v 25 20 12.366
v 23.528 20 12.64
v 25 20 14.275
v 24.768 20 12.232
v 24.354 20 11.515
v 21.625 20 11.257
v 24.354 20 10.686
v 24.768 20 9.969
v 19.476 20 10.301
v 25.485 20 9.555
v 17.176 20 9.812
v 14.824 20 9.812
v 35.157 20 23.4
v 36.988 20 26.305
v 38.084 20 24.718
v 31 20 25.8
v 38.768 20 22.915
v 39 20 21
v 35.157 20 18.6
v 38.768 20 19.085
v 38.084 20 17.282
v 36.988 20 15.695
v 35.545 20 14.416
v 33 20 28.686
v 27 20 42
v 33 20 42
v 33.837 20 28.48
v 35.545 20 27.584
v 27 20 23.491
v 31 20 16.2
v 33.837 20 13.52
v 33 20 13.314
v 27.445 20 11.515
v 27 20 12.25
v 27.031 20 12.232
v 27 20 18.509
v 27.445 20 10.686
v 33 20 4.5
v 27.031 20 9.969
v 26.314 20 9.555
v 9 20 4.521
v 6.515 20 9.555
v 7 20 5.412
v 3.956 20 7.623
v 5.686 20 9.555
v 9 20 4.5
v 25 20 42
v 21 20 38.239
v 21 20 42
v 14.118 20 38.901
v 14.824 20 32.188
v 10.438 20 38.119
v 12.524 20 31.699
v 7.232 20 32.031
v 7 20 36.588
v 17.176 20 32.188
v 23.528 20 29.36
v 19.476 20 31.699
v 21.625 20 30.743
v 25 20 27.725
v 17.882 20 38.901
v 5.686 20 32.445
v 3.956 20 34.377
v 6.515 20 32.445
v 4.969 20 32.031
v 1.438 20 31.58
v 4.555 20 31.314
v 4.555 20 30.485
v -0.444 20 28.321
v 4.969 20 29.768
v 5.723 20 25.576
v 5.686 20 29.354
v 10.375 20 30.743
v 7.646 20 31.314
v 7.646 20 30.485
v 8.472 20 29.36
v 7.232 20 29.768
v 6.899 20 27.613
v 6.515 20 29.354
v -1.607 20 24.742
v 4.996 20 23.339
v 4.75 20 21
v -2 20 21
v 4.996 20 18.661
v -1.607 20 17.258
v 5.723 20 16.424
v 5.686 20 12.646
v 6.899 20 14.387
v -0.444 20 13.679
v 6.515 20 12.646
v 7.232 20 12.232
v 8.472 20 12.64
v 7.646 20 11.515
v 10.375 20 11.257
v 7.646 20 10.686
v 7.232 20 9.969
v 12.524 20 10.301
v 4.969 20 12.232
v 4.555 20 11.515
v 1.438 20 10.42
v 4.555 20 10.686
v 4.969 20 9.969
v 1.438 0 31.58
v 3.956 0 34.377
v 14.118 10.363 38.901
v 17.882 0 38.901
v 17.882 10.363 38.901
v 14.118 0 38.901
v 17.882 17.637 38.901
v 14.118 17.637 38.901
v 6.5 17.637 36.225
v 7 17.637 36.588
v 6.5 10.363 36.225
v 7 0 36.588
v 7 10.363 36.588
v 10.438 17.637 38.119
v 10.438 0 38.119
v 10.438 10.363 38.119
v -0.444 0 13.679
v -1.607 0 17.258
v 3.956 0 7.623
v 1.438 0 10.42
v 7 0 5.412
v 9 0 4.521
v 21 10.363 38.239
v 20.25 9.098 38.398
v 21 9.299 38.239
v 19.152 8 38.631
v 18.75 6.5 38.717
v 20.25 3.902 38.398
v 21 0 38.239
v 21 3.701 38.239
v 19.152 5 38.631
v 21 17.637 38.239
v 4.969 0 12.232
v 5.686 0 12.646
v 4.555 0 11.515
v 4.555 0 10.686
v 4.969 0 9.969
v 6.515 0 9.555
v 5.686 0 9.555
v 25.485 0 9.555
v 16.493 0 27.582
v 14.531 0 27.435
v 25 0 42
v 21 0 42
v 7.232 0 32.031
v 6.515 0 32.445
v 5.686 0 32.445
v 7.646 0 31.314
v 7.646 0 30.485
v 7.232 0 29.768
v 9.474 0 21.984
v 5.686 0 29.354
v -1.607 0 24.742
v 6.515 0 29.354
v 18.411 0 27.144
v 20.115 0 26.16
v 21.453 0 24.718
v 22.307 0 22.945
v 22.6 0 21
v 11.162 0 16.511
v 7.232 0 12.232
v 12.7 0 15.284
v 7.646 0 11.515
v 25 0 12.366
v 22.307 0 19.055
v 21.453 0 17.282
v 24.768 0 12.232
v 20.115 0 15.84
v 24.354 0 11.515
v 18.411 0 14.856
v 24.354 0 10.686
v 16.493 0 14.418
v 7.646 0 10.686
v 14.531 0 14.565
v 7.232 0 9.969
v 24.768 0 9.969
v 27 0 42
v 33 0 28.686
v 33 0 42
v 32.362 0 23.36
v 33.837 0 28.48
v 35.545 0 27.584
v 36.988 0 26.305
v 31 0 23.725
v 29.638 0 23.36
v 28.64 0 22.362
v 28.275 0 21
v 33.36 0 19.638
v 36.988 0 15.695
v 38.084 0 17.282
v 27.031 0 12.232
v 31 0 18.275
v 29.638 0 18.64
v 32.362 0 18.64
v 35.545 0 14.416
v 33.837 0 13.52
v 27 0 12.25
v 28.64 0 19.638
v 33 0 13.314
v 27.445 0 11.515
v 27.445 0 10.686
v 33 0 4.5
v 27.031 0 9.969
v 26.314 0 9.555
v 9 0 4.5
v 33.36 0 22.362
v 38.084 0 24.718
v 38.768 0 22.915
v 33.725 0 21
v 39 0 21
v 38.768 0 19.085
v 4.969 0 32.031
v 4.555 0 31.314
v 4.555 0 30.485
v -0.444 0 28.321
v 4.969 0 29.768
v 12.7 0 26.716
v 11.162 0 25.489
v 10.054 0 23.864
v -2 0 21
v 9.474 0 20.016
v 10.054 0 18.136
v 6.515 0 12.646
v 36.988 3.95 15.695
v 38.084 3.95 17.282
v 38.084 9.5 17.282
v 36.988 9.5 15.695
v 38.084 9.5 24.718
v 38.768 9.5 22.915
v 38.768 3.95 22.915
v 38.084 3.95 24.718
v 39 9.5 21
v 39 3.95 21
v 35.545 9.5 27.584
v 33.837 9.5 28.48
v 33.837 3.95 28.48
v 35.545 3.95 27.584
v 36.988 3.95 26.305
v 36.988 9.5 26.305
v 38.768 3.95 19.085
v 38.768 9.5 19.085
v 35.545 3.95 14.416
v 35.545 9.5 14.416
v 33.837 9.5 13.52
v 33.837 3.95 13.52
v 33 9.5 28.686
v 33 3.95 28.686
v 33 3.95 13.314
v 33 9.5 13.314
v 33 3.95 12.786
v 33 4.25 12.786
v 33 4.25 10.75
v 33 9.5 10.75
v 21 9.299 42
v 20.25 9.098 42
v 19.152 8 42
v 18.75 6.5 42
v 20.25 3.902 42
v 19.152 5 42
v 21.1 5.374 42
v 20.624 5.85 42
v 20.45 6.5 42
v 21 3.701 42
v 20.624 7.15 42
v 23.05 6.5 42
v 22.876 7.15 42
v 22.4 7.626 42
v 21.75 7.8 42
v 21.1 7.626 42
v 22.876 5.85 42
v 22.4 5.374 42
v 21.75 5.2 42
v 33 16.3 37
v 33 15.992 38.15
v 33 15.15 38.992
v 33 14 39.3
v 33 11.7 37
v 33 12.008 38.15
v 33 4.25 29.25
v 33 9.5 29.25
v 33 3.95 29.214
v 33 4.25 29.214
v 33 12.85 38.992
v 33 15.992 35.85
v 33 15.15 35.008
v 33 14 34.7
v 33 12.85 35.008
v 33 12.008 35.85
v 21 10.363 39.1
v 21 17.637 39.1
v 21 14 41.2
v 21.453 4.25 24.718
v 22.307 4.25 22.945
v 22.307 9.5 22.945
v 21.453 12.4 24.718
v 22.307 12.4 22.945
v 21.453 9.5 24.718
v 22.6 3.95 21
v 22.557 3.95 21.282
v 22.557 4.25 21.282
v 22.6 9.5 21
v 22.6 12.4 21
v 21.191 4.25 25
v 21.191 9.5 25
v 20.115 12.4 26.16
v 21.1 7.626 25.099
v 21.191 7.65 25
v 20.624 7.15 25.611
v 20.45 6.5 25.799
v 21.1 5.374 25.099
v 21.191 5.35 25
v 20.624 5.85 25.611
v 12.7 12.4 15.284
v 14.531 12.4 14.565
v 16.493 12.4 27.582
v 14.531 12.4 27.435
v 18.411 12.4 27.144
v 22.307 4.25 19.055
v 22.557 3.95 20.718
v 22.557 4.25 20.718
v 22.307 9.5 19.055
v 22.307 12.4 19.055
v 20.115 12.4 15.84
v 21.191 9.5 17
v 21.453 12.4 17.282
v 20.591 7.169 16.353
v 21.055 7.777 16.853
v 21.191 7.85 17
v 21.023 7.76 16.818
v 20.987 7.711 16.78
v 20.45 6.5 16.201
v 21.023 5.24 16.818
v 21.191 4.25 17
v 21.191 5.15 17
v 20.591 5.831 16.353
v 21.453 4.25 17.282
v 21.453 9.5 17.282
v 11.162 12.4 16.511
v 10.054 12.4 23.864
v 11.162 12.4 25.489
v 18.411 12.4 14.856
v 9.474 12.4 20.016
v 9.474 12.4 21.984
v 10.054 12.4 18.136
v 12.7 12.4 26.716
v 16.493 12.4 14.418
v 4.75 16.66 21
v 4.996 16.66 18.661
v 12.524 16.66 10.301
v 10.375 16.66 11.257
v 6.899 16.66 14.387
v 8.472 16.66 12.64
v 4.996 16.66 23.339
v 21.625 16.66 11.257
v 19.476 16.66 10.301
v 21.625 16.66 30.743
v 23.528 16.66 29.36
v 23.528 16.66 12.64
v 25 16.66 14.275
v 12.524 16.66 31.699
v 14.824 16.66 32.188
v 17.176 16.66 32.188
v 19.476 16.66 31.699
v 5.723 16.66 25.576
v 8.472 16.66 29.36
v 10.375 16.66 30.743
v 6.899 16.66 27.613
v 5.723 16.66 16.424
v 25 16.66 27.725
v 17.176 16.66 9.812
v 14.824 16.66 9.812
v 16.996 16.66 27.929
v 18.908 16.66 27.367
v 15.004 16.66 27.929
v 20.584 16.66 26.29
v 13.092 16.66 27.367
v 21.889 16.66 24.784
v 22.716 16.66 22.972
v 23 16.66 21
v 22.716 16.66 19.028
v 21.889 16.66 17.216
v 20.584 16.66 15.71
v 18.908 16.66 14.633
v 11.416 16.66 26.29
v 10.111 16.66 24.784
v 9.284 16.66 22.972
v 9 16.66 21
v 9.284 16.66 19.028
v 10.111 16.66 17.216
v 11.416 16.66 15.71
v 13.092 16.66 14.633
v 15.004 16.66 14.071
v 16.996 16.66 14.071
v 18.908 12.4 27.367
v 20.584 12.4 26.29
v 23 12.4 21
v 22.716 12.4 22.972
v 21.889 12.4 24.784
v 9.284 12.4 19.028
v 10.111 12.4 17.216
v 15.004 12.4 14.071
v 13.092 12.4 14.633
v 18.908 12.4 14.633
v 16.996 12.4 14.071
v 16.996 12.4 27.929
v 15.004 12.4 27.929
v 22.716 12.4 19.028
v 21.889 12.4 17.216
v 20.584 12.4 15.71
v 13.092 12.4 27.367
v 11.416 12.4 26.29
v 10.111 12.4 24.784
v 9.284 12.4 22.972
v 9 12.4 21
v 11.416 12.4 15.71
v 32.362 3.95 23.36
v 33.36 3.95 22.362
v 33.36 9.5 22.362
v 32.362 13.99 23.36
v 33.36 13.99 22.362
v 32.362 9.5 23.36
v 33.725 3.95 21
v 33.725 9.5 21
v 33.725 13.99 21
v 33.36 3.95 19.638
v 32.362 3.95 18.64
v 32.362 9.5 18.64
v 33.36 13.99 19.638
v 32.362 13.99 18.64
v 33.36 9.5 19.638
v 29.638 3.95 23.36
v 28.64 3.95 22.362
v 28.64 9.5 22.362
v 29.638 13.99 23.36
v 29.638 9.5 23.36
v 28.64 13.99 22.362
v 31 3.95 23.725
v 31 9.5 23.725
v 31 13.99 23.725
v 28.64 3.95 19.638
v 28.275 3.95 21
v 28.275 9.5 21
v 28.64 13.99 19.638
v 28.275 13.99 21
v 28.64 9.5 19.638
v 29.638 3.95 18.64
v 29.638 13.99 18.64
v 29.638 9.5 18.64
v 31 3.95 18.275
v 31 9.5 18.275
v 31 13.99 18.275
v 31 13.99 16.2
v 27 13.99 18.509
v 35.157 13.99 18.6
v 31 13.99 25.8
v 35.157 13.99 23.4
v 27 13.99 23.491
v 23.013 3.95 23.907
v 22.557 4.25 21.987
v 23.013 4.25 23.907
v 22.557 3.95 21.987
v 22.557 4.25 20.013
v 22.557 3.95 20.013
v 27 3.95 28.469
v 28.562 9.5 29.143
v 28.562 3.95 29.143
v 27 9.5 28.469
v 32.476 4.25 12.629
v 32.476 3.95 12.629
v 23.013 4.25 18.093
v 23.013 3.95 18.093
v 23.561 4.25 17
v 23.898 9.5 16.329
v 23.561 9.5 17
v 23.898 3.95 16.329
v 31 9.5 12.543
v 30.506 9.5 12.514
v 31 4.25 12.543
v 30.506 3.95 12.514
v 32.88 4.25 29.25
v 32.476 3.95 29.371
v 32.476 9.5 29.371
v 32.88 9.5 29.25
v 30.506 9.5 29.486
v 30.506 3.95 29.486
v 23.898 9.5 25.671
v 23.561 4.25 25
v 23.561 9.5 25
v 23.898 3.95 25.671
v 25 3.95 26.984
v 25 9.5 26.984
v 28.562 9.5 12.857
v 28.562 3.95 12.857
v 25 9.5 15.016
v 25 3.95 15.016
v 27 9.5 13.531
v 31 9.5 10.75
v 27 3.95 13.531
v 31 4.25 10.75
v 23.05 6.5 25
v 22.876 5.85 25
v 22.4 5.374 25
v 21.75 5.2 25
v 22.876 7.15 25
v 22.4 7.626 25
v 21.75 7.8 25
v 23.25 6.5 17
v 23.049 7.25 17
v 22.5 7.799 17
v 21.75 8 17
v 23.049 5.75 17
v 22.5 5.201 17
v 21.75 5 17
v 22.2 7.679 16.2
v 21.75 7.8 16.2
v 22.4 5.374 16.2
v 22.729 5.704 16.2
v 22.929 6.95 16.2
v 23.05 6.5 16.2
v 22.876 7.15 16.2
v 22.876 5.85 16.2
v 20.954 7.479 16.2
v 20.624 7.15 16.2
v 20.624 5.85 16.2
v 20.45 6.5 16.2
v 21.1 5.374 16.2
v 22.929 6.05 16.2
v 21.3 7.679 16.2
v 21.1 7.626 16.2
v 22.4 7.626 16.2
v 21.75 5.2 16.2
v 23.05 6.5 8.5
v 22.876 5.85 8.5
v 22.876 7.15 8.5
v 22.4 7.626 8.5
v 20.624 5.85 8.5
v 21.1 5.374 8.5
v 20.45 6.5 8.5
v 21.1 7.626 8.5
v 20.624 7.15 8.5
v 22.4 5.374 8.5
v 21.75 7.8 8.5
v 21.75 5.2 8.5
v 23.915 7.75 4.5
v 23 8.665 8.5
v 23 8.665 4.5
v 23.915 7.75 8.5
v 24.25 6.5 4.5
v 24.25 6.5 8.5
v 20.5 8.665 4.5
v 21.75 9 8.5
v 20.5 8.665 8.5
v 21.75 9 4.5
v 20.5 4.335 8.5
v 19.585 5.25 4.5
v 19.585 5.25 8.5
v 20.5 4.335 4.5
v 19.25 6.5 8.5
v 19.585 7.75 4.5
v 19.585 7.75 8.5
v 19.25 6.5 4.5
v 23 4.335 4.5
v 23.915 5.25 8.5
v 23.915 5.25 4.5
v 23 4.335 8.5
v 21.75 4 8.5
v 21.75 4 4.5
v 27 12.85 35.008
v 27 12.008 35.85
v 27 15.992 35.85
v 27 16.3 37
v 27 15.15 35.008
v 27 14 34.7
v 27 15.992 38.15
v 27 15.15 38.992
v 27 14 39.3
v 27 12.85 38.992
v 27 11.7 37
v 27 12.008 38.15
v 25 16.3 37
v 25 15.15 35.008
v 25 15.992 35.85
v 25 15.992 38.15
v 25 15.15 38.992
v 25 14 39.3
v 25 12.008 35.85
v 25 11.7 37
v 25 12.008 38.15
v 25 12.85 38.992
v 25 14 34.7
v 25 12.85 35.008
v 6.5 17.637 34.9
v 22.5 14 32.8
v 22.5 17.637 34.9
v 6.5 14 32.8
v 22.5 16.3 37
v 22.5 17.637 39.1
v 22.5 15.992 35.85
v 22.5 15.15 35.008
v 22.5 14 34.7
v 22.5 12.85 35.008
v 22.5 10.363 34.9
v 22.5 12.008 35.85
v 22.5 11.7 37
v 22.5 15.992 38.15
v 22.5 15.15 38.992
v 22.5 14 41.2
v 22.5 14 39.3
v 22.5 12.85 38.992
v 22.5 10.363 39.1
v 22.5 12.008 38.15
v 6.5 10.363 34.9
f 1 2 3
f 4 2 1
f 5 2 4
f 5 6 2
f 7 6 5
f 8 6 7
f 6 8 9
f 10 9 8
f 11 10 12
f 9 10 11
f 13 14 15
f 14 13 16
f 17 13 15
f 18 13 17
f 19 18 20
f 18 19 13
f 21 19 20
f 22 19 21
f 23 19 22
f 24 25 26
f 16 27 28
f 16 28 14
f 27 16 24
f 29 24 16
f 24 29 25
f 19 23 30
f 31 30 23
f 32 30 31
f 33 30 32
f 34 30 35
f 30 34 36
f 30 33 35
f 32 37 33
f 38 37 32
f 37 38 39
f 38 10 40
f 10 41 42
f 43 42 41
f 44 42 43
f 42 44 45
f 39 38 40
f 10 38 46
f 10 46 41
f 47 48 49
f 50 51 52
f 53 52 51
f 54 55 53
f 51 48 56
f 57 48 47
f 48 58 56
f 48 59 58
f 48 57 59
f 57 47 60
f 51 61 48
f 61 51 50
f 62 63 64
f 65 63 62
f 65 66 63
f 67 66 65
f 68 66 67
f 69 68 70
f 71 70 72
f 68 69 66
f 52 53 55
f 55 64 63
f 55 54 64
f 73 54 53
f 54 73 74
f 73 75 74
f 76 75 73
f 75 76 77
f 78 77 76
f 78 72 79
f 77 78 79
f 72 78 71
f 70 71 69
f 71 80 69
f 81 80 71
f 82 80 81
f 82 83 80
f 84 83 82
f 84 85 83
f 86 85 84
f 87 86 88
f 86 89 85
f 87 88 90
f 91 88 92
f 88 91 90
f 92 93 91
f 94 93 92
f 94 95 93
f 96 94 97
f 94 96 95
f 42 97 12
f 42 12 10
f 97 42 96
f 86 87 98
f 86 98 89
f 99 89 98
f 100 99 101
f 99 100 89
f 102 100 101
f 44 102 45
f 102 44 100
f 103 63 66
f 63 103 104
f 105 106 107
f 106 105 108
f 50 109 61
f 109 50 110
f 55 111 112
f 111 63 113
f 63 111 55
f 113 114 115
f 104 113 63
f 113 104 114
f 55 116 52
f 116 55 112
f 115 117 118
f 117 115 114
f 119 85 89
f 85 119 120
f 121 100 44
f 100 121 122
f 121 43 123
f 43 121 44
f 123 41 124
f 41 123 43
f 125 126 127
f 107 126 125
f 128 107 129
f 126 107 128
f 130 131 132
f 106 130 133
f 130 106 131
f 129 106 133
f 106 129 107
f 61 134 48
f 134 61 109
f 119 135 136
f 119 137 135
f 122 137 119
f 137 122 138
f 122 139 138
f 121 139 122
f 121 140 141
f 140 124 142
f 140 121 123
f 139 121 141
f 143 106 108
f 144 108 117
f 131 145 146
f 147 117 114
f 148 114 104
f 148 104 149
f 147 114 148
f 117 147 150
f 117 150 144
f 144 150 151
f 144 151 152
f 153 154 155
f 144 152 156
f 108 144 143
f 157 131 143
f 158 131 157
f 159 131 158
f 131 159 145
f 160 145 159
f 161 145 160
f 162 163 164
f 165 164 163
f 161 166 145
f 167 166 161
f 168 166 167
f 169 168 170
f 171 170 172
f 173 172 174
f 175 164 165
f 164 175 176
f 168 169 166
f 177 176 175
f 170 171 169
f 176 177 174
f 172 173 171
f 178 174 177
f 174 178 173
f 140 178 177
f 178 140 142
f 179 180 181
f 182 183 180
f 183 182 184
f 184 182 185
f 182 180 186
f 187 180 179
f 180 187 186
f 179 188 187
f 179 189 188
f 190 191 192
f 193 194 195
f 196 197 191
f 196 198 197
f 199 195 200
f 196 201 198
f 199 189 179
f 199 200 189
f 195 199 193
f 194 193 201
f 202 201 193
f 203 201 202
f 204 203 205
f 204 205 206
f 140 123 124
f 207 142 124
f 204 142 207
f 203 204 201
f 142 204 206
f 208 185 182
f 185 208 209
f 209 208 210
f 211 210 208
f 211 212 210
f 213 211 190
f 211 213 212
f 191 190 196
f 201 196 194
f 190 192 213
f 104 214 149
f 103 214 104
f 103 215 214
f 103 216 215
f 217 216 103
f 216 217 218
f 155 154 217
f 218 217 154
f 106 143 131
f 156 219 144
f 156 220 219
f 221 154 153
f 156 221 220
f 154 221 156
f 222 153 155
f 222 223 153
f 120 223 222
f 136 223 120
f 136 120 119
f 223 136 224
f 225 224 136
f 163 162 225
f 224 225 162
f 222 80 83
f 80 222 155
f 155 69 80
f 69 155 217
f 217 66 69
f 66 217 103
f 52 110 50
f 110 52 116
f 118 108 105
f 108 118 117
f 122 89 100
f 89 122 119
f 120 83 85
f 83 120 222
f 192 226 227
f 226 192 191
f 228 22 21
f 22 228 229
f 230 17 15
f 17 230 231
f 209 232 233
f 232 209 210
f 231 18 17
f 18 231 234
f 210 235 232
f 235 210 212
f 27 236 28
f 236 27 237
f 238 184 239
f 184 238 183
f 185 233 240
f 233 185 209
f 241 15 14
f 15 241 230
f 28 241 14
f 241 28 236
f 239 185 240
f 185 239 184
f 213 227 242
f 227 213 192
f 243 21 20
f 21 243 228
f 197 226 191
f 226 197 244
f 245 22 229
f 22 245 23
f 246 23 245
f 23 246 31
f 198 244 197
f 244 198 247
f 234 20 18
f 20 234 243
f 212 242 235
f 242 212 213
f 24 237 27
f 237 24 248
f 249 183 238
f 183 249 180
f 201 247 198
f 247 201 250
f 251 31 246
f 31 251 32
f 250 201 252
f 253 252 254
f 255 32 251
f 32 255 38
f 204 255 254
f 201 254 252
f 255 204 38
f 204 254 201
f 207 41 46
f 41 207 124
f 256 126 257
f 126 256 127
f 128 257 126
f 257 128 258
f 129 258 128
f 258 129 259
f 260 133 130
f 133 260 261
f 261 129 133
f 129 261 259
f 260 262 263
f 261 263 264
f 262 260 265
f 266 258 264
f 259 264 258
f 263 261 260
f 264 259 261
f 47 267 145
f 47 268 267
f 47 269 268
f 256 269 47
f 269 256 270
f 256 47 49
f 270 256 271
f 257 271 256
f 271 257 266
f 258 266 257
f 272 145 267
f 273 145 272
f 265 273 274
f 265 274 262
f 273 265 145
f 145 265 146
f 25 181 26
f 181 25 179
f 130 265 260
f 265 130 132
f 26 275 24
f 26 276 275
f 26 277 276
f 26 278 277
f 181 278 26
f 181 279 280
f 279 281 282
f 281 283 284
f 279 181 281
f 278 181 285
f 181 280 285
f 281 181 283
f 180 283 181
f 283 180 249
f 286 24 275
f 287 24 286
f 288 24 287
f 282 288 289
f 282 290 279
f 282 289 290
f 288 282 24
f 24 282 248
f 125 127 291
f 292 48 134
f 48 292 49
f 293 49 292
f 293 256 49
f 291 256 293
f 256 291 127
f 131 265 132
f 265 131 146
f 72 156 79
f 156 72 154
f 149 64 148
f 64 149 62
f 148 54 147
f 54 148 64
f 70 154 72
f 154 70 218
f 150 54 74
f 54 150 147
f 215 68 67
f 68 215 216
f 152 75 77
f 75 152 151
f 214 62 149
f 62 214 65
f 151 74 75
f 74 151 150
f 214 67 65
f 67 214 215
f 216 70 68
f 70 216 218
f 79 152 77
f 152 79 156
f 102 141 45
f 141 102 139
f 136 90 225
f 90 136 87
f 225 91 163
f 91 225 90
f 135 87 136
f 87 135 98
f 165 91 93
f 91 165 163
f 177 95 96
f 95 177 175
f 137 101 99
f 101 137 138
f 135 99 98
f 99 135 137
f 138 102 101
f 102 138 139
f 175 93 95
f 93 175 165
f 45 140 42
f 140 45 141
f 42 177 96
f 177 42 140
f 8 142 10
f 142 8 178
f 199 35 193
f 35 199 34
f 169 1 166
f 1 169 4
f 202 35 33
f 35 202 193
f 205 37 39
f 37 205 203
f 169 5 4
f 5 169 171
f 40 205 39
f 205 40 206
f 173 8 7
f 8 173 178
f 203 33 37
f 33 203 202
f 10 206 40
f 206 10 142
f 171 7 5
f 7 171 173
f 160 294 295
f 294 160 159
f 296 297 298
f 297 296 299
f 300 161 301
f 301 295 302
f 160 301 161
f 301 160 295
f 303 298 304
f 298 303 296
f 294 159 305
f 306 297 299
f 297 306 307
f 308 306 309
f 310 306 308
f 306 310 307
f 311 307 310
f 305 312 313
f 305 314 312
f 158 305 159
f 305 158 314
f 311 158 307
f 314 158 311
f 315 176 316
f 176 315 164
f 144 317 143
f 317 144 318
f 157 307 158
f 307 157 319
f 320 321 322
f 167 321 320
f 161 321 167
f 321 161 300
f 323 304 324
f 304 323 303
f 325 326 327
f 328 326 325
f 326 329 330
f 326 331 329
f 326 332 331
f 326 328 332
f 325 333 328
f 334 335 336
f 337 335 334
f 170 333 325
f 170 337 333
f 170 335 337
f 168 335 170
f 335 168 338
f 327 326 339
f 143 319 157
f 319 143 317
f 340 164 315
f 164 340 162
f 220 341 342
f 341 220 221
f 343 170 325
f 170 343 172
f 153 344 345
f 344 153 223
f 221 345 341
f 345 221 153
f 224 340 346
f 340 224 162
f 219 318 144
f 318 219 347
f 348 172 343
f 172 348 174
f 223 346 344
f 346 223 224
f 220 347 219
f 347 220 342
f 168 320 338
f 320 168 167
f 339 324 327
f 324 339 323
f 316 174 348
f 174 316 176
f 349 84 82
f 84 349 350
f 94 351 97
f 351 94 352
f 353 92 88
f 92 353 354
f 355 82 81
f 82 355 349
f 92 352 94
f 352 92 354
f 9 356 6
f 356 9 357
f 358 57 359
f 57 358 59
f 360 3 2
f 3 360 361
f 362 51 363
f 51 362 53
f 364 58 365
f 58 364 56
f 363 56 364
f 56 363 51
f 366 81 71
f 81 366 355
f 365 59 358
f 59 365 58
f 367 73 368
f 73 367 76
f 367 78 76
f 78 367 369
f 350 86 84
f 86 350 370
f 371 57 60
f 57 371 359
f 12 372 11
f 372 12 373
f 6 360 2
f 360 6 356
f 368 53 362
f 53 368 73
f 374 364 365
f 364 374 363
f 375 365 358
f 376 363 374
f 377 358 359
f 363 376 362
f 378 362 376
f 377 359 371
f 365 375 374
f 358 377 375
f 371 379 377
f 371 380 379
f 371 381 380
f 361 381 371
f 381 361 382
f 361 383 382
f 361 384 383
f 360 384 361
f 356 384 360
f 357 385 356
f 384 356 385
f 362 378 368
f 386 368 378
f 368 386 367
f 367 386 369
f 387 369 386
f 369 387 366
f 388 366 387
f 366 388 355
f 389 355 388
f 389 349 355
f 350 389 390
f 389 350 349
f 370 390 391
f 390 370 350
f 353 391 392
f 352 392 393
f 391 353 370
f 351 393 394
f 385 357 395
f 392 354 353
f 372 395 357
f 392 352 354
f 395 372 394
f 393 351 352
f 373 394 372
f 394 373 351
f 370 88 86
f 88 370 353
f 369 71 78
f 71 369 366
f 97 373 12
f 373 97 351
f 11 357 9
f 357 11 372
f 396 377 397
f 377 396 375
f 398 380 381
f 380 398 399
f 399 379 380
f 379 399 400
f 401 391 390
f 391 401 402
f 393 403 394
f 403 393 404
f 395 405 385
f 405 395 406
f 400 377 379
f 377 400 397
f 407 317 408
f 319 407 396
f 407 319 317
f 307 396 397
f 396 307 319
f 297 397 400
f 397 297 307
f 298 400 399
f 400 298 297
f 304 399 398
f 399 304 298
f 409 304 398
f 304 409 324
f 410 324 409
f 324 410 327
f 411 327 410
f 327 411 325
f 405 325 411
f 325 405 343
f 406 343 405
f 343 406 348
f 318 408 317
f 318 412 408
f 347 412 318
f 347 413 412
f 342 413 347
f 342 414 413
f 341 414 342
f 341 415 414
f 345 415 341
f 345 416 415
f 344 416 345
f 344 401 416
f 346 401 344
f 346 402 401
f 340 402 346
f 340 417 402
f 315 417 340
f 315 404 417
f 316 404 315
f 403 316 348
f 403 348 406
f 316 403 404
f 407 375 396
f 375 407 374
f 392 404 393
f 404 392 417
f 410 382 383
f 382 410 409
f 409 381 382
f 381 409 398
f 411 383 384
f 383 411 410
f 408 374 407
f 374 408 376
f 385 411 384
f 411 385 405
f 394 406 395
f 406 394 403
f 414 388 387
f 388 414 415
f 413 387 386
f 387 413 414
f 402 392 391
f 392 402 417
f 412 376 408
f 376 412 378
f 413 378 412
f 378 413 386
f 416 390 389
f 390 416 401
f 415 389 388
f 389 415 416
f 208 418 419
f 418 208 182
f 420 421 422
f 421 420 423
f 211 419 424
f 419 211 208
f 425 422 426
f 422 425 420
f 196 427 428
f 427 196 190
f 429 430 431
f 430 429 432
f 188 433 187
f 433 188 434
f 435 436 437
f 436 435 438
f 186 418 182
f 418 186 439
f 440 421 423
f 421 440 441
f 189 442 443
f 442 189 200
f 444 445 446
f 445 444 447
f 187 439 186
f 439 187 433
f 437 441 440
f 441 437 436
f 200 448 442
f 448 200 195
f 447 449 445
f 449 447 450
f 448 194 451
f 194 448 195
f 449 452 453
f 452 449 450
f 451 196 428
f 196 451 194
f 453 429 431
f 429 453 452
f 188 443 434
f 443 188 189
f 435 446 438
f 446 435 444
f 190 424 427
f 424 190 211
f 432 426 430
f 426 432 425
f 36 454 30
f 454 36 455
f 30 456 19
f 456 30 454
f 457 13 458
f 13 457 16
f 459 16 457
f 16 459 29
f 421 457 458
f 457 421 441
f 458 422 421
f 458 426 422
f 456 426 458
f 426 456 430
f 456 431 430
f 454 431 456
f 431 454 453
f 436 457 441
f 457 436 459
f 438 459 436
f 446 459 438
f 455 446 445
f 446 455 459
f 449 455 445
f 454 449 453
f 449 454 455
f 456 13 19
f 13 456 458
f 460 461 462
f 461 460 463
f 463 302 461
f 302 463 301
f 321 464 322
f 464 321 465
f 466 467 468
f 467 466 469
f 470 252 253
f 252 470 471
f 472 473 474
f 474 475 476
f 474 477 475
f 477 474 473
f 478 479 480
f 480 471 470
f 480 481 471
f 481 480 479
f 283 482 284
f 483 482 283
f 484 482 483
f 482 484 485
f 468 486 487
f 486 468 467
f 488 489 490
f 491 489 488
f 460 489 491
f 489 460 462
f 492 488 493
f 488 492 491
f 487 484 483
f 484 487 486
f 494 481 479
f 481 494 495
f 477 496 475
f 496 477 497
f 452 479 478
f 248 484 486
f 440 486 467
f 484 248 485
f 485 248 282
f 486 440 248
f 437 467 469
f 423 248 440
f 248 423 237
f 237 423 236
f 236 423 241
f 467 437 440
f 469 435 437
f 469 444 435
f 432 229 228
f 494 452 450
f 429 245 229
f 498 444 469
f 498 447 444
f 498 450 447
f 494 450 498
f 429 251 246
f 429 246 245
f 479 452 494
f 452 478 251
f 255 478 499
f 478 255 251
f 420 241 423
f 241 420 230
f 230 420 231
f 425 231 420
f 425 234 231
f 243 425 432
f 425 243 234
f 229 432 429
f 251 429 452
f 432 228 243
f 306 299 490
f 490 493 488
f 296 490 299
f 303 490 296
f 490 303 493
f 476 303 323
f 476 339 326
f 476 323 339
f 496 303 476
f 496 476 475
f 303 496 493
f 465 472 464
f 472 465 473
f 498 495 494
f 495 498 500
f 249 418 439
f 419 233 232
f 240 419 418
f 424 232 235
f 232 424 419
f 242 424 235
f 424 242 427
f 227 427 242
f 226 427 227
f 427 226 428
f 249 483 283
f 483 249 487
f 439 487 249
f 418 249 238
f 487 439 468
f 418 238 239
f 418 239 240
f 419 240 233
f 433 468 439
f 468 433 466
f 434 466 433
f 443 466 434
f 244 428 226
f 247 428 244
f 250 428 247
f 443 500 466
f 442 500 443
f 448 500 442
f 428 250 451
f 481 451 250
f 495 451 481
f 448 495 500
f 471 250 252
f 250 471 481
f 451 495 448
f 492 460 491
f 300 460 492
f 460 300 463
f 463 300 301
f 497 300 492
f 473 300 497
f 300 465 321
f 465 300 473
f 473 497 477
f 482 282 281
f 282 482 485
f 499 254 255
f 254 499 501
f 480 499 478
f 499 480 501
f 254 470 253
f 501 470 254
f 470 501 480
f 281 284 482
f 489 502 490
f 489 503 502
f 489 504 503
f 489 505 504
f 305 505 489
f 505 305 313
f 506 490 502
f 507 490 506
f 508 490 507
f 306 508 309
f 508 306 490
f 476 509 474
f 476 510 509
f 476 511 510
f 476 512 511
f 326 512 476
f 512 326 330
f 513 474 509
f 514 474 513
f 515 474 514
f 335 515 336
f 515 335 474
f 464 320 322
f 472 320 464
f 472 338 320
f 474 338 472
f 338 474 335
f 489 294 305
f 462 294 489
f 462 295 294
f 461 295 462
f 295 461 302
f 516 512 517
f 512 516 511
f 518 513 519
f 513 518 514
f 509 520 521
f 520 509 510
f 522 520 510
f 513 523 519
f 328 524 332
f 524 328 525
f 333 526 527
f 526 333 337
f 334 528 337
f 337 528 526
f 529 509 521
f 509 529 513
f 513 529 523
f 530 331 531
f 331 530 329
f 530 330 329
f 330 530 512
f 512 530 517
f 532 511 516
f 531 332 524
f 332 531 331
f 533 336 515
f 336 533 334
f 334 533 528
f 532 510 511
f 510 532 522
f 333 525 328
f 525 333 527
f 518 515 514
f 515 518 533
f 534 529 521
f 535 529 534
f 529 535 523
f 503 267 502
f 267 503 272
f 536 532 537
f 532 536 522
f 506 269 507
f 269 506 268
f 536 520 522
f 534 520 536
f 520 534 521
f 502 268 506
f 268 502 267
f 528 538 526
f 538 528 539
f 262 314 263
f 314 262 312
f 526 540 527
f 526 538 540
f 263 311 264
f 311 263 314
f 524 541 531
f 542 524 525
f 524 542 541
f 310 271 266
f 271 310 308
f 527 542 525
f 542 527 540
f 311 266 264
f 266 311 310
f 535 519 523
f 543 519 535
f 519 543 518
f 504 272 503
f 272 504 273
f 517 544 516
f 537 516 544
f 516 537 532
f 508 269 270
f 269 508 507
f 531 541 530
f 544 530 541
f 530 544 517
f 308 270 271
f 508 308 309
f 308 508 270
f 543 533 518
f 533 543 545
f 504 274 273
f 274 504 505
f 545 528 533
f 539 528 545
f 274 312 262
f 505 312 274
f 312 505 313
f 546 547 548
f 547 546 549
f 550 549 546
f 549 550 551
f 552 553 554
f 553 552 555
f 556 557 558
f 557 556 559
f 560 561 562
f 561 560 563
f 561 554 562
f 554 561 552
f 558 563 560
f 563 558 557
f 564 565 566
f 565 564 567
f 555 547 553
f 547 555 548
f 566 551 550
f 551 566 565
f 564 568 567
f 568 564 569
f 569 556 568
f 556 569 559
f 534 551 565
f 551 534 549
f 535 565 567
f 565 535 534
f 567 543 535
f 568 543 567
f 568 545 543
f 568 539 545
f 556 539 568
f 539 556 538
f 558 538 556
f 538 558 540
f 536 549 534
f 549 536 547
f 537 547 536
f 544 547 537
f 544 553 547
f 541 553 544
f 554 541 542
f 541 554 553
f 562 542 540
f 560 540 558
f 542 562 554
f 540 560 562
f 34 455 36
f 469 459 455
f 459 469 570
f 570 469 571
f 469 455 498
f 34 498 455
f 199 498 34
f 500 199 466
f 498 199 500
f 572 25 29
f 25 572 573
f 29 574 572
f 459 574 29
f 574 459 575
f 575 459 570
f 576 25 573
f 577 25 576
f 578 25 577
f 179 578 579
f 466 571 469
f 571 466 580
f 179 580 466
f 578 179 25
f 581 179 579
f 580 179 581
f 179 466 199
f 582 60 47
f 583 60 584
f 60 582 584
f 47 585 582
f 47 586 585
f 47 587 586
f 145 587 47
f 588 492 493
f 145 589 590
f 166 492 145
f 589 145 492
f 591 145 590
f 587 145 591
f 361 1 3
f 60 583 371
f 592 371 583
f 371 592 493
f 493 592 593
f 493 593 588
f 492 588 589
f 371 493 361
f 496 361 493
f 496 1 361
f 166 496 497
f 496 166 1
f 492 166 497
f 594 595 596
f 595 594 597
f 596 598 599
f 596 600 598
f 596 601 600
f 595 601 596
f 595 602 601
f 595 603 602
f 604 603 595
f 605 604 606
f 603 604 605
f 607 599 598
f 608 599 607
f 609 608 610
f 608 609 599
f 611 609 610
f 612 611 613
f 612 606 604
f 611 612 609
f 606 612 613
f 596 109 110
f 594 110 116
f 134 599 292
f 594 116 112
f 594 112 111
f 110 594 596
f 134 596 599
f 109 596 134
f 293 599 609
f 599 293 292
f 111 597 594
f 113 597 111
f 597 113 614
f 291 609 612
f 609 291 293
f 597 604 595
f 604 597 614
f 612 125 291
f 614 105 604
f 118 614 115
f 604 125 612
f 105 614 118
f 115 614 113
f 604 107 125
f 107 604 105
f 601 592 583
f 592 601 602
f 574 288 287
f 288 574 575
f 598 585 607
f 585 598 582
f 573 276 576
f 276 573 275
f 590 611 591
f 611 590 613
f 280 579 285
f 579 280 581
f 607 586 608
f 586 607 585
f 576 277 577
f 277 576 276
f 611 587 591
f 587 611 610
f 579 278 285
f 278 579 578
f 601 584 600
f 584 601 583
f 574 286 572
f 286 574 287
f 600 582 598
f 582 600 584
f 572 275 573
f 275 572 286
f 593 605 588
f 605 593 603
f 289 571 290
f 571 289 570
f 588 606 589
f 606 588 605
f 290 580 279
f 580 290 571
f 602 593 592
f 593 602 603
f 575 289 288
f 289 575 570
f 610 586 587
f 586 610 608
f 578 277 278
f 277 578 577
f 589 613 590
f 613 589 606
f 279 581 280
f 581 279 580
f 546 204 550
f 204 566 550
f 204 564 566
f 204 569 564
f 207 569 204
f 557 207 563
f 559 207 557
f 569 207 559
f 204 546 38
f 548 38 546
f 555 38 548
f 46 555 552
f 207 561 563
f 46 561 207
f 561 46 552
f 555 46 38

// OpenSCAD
first_layer = 0.3;

difference() {
	
	union() {
		//main cylinder
		translate([16,20,21]) rotate([90,0,0]) cylinder(h=20, r=18);//cube([44, 20, 42]);
		
		//bearing mount
		translate([31,20,21]) rotate([90,0,0]) cylinder (h=20, r=8);
		
		//V3 Mount
		translate([9,0,-7]) cube([24, 20, 22]);
		translate([21,first_layer/2,-11]) rotate([90,0,0]) cube([24, 22, first_layer], center=true);
		//translate([27,first_layer/2,45]) rotate([90,0,0]) cube([12, 22, first_layer], center=true);
		
		//filament support
		translate([21.75,6.5,34]) rotate([0,0,0]) cylinder (h=8, r=3, $fn=12);
		
		//groovemount supports
//		translate([33,6.5,-7]) rotate([0,0,0]) cylinder (h=16, r=5, $fn=12);
//		translate([9,6.5,-7]) rotate([0,0,0]) cylinder (h=16, r=5, $fn=12);
		
		//clamp
		translate([21,0,28]) cube([12, 20, 14]);
	}
	
	//pulley opening
	translate([16,21,21]) rotate([90,0,0]){
		cylinder (h=22, r=6.6);
		
		rotate([0,0,45]) {
		//translate([14,0,0]) cylinder(h=22, r=1.6, $fn=12);
		translate([0,14,0]) cylinder(h=22, r=1.6, $fn=12);
		translate([-14,0,0]) cylinder(h=22, r=1.6, $fn=12);
		translate([0,-14,0]) cylinder(h=22, r=1.6, $fn=12);
		}
	}
	
	//gearhead indentation
	translate([16,20.01,21]) rotate([90,0,0]) cylinder (h=3.35, r=11.25);

	//pulley hub indentation
	translate([16,20-2,21]) rotate([90,0,0]) cylinder (h=5.6, r=7);
	
	//bearing screws
	translate([31,21,21]) rotate([90,0,0]) cylinder (h=22, r=2.725, $fn=12); //precision m5

	//translate([31,21,21]) rotate([90,0,0]) cylinder (h=22, r=2.6, $fn=12); //regular M5 screw
	//translate([31,22,21]) rotate([90,30,0]) cylinder (h=8.01, r=8.1/2, $fn=6); //M4
	translate([31,22,21]) rotate([90,30,0]) cylinder (h=8.01, r=4.8, $fn=6); //M5
	
	//bearing
	translate([31,9.5,21]) rotate([90,0,0]) cylinder (h=5.55, r=8.5);
	translate([31,9.5-5.25,21-8.25-2]) cube([20, 5.25, 18.5]);
	
	//opening between bearing and pulley
	translate([20,9.5-5.25,21-8.25+3.25+1]) cube([10, 5.25, 8]);

	//filament path chamfer
	translate([21.75,6.5,15]) rotate([0,0,0]) cylinder (h=2, r1=1, r2=1.5, $fn=12);		
	
	//filament path
	translate([21.75,6.5,-10]) rotate([0,0,0]) cylinder (h=60, r=1.3, $fn=12); 
	translate([21.75,6.5,-51.5]) rotate([0,0,0]) cylinder (h=60, r=2.5, $fn=12); 
	
	//V3 Mount
//	translate([21.75,6.5,-2]) rotate([0,0,0]) cylinder (h=5, r=8.25);
	translate([21.75,6.5,-7]) rotate([0,0,0]) cylinder (h=8, r=4.5);
//	translate([21.75-8,6.5-8,-2]) cube([16, 8, 5]);
//	translate([21.75-6,6.5-7,-7]) cube([12, 7, 5]);
	translate([21.75,6.5,3.5]) rotate([90,0,0]) cylinder (h=10, r=1,  $fn=12);
	
	//groovemount supports
//	translate([33,6.5,-8]) rotate([0,0,0]) cylinder (h=20, r=1.6, $fn=12);
//	translate([33,6.5,7]) rotate([0,0,0]) cylinder (h=3, r=3.5, $fn=6);

//	translate([9,6.5,-8]) rotate([0,0,0]) cylinder (h=20, r=1.6, $fn=12);
//	translate([9,6.5,7]) rotate([0,0,0]) cylinder (h=3, r=3.5, $fn=6);
//	translate([3,3,7]) cube([8, 7, 3]);
	
	//clamp slit
	translate([25,-1,10]) cube([2, 22, 35]);
	//clamp nut
	translate([6.5,14,37]) rotate([0,90,0]) cylinder (h=16, r=4.2, $fn=6);
	//clamp screw hole
	translate([15,14,37]) rotate([0,90,0]) cylinder (h=20, r=2.3, $fn=12);
	
	translate([9,-2,-25.5])cube(30,20,10);
    translate([9,-2,43.5])cube(30,20,10);
}
